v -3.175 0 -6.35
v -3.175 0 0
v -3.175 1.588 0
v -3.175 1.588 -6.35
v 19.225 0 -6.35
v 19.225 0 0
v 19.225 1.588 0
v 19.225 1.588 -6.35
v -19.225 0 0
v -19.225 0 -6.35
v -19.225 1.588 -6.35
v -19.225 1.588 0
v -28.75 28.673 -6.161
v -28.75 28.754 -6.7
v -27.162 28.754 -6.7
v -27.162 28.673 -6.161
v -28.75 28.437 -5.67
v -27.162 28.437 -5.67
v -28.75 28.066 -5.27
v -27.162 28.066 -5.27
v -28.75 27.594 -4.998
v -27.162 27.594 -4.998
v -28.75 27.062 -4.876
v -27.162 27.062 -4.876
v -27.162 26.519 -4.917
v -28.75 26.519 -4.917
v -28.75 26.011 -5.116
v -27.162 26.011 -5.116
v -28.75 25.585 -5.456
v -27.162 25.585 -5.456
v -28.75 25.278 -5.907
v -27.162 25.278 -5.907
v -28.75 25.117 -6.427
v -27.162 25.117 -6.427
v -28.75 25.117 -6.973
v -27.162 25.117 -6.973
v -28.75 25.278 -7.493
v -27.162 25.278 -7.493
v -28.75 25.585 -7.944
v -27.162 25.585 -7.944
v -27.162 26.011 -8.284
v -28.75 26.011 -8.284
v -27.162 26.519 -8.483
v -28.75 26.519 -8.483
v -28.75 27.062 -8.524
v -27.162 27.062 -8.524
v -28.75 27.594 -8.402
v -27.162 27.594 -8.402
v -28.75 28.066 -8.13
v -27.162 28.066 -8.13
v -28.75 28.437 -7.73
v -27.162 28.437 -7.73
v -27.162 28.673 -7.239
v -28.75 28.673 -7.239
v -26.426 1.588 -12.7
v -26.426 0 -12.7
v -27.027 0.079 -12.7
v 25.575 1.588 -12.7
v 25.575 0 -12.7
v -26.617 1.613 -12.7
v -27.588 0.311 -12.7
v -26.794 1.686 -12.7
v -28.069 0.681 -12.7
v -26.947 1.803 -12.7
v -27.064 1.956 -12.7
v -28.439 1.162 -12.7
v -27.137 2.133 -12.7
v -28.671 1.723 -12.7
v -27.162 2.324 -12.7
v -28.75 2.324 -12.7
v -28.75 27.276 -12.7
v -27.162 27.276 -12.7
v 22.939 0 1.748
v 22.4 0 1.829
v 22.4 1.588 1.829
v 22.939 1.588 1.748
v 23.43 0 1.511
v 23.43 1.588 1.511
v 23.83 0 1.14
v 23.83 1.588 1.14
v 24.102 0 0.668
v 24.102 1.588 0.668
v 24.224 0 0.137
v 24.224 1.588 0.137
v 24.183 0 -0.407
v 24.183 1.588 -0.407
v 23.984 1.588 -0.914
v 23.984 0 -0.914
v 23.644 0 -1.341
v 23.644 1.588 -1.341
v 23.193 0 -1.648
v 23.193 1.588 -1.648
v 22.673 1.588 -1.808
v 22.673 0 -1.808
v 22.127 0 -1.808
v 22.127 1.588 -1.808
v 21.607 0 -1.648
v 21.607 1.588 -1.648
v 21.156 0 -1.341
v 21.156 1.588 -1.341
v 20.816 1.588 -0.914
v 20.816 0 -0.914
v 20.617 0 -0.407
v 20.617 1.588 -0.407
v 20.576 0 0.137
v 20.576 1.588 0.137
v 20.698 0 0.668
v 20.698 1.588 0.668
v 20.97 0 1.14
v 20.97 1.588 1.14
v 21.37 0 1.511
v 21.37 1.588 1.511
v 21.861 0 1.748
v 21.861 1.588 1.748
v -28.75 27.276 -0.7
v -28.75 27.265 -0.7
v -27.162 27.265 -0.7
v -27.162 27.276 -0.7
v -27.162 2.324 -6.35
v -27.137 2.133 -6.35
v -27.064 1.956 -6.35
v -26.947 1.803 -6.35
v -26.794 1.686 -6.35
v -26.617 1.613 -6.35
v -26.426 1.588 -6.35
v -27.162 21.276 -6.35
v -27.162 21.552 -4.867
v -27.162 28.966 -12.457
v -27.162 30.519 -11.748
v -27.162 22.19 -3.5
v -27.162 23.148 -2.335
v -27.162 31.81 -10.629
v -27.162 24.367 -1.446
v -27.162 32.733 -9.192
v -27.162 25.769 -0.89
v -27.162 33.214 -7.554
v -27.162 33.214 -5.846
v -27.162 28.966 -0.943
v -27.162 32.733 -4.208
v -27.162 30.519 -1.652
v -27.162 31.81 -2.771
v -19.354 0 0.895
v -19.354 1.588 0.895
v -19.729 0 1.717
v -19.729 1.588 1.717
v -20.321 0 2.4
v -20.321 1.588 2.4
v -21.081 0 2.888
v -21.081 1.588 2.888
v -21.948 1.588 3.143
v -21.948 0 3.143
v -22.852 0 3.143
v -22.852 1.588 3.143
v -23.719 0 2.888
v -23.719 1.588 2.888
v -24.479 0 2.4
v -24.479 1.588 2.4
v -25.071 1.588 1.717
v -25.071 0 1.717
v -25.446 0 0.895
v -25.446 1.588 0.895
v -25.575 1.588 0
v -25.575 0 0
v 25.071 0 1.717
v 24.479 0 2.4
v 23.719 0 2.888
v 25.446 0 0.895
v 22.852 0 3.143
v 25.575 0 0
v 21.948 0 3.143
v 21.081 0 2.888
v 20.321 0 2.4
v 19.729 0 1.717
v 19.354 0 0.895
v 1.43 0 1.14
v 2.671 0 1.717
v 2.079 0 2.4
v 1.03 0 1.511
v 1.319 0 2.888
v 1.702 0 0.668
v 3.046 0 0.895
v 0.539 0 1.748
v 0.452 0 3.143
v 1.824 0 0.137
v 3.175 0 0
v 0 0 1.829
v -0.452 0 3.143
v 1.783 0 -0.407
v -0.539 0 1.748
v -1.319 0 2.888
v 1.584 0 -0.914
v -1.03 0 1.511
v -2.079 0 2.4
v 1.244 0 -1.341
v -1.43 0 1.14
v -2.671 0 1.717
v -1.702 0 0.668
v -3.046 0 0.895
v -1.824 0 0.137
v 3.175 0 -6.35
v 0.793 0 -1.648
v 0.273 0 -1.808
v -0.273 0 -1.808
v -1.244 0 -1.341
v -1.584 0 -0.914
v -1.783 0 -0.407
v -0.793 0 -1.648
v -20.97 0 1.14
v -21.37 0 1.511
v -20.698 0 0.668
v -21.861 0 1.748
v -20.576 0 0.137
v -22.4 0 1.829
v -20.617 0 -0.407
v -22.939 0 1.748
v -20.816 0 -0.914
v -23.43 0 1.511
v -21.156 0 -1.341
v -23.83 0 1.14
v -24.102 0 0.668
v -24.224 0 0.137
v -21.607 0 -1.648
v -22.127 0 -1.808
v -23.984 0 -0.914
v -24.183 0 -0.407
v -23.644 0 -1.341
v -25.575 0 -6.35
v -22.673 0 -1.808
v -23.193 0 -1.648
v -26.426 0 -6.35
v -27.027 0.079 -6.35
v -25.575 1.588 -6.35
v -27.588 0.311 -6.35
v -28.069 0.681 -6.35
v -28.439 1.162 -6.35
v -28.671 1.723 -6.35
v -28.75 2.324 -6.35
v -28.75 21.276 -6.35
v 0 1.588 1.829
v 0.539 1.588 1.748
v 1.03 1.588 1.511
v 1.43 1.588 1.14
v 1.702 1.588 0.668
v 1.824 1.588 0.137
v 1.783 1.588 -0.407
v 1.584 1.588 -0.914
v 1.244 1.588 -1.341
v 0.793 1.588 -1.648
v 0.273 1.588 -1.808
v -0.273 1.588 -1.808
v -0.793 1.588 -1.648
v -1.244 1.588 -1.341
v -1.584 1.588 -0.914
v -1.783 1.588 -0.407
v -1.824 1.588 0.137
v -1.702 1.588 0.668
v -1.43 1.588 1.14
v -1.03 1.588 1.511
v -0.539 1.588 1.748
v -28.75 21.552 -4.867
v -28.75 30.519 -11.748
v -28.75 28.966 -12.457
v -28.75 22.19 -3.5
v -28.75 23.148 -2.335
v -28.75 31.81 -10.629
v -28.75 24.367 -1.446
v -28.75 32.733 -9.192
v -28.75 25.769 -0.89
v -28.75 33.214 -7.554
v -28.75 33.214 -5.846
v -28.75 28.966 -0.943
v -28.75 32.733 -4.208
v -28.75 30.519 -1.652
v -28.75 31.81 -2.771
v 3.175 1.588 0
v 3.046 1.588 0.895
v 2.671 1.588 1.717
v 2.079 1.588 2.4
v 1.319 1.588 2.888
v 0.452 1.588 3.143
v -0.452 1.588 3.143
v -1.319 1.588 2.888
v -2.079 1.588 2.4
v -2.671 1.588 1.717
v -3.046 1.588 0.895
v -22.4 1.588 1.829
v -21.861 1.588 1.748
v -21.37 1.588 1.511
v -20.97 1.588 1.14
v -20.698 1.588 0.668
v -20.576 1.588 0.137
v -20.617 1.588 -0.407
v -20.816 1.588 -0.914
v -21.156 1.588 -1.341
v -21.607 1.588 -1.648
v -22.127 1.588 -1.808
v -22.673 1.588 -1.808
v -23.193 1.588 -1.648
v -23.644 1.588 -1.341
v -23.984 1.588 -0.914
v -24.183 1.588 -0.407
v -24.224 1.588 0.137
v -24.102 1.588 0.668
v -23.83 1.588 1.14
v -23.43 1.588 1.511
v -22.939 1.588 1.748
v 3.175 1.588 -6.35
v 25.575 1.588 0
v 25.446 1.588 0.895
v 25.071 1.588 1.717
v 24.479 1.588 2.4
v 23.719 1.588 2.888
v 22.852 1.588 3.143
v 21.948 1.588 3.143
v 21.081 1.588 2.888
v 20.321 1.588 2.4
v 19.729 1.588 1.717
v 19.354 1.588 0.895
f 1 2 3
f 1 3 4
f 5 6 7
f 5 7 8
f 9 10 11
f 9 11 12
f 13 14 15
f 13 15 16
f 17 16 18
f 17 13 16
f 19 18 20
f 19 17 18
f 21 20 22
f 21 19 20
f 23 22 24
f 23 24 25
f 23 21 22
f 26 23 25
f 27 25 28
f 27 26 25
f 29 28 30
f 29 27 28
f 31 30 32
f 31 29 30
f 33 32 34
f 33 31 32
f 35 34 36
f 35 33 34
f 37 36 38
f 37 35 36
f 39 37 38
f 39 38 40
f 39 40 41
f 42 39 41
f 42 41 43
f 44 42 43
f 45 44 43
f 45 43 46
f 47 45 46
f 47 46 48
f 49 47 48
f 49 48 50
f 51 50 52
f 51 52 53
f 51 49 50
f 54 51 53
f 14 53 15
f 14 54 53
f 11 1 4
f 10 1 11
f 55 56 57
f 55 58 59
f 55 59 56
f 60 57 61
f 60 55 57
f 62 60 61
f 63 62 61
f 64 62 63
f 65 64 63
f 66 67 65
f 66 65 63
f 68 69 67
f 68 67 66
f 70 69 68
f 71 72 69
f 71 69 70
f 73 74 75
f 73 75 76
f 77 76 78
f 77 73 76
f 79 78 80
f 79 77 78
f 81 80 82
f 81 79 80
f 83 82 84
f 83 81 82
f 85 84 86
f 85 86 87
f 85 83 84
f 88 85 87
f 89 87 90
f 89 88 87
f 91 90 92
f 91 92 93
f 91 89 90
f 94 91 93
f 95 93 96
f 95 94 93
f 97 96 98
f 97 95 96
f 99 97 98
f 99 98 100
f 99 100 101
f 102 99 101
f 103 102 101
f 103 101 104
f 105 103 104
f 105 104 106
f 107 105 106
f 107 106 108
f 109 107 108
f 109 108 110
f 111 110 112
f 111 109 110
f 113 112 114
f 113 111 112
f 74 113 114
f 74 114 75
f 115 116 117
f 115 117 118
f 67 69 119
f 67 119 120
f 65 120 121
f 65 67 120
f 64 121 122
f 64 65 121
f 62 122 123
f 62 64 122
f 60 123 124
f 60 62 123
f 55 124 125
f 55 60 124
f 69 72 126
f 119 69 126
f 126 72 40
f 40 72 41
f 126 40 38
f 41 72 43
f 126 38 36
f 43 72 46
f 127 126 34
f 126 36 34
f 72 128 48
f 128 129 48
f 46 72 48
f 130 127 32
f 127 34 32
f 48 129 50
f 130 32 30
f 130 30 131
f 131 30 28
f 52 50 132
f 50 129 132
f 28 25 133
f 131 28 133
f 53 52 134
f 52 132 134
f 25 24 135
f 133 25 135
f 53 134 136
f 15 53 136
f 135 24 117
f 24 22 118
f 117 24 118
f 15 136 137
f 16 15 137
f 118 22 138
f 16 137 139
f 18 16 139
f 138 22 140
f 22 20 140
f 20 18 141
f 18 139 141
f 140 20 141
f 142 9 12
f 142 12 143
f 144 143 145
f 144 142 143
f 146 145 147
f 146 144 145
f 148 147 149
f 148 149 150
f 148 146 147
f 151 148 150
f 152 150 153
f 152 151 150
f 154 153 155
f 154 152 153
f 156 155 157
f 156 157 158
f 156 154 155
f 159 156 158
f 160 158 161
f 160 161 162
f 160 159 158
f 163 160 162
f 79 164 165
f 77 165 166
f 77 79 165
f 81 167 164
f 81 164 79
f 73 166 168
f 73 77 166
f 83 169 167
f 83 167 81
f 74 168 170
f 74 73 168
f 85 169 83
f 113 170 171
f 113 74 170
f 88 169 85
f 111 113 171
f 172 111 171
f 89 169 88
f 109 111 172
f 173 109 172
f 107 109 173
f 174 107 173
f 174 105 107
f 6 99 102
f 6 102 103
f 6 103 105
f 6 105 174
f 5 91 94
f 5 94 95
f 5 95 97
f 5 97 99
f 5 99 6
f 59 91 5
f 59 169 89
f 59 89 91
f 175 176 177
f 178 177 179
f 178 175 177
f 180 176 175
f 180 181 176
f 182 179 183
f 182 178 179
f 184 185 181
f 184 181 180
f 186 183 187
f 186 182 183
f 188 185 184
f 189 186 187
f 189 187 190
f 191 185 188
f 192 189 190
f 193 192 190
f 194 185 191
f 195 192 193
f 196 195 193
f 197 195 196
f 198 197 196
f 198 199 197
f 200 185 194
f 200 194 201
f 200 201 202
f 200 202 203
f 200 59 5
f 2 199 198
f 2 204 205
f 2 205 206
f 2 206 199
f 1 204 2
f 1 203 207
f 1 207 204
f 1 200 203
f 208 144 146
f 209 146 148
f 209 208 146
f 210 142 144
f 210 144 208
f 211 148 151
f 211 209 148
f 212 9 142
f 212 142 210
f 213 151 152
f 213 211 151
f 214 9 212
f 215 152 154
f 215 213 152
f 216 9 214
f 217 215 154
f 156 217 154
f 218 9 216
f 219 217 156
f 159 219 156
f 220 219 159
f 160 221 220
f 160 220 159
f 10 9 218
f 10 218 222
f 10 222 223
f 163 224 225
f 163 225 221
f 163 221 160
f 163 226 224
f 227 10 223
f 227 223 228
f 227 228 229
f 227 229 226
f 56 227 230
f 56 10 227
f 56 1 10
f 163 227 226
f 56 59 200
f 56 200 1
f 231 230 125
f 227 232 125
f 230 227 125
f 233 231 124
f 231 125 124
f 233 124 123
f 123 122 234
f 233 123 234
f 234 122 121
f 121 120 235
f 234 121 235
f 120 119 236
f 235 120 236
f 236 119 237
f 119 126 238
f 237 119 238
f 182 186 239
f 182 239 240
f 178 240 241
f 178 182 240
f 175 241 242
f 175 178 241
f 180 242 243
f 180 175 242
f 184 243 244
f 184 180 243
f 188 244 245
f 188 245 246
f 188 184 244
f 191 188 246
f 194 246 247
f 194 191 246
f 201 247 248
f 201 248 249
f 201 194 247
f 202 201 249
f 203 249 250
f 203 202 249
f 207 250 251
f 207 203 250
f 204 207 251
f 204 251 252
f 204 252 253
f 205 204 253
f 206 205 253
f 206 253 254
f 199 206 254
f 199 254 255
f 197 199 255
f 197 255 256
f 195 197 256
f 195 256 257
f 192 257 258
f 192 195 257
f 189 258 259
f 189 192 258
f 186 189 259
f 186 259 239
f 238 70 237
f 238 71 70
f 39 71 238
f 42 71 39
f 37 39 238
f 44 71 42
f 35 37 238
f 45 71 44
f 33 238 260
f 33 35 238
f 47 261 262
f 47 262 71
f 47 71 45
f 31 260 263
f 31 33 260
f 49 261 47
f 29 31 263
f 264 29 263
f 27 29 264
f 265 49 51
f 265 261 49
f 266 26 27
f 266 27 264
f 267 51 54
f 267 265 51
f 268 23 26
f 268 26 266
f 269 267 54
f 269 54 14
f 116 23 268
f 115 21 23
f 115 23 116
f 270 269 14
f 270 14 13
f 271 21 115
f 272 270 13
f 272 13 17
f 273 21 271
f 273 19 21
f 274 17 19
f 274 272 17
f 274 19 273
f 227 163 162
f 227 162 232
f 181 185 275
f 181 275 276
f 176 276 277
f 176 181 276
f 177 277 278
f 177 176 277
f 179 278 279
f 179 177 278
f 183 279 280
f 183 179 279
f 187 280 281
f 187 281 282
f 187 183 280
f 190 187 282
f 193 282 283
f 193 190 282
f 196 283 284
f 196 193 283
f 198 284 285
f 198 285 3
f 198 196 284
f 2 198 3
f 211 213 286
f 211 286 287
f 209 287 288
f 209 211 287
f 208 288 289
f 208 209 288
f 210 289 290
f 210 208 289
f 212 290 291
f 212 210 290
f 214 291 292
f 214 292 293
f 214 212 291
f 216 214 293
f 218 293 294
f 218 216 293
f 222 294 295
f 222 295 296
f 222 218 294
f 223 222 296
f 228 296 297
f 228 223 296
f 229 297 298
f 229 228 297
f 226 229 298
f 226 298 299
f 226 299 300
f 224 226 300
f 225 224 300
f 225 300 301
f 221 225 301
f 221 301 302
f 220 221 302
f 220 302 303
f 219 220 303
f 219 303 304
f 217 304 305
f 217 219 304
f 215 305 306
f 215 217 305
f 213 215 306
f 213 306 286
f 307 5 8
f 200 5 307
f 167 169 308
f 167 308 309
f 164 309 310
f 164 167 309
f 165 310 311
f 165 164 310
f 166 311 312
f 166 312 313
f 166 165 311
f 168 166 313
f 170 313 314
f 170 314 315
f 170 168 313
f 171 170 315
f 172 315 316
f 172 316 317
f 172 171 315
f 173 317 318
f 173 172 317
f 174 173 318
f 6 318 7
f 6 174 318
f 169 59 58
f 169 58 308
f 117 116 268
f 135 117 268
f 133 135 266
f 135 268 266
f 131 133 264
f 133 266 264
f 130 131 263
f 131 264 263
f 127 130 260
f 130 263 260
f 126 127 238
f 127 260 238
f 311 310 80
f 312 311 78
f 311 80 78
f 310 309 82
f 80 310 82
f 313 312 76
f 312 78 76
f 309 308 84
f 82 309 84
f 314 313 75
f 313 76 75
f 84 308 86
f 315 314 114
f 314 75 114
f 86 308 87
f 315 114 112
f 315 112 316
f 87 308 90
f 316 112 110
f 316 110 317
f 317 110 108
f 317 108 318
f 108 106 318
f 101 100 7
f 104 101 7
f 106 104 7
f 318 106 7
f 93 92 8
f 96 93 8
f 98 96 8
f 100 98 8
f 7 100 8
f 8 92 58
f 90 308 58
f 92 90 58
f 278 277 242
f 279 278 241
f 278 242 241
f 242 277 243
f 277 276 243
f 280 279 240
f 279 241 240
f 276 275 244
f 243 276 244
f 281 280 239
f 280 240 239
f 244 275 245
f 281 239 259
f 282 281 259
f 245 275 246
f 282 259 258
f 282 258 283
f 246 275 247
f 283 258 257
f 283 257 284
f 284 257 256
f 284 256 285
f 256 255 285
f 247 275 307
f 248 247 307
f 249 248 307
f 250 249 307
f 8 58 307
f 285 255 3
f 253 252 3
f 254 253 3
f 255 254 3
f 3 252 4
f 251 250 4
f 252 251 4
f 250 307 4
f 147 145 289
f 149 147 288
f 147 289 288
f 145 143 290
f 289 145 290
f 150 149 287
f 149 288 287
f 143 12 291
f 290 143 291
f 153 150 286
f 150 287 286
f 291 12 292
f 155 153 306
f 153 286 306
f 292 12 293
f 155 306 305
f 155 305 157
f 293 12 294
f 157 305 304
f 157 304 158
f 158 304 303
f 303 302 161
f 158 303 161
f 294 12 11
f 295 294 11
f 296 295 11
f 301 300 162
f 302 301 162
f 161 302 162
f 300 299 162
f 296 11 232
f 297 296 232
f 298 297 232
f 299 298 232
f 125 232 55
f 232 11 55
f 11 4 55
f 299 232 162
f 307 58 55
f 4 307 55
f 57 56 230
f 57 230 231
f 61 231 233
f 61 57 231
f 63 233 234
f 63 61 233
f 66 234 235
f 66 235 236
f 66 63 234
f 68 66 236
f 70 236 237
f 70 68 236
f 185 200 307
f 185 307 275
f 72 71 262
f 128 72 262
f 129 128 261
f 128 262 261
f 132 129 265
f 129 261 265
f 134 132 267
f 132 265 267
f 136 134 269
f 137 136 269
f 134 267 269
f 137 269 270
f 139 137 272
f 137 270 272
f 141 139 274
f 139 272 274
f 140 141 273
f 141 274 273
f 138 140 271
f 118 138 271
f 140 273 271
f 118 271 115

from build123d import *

# Parameters (mm, degrees)
SKETCH1_R                    = 1.8288
BASE_FLANGE1_DEPTH           = 1.5875
EDGE_FLANGE2_STRIP_W         = 7.8232
EDGE_FLANGE2_STRIP_H         = 1.5875
EDGE_FLANGE2_STRIP_CUT_DEPTH = 6.35
EDGE_FLANGE2_DEPTH           = 6.35
SKETCH19_W                   = 5.65
SKETCH19_H                   = 12
TAB1_DEPTH                   = 1.5875
HOLE1_START                  = -28.75
HOLE1_OUTLINE_R              = 1.8288
HOLE1_DEPTH                  = 1.5875
FILLET1_R                    = 6


# Read off the part's stored shape, not the designer's step: Hole1
# Sheet-metal steps are written as plain solids
with BuildPart() as part:
    # Sketch1 → Base-Flange1 (new body)
    with BuildSketch(Plane(origin=(0, 0, 0), x_dir=(1, 0, 0), z_dir=(0, 1, 0))):
        with BuildLine():
            Line((-25.575, 0), (-25.575, 6.35))
            Line((-25.575, 6.35), (-27.1625, 6.35))
            Line((-27.1625, 6.35), (-27.1625, 12.7))
            Line((-27.1625, 12.7), (0, 12.7))
            Line((0, 12.7), (25.575, 12.7))
            Line((25.575, 12.7), (25.575, 0))
            ThreePointArc((25.575, 0), (22.4, -3.175), (19.225, 0))
            Line((19.225, 0), (19.225, 6.35))
            Line((19.225, 6.35), (3.175, 6.35))
            Line((3.175, 6.35), (3.175, 0))
            ThreePointArc((3.175, 0), (0, -3.175), (-3.175, 0))
            Line((-3.175, 0), (-3.175, 6.35))
            Line((-3.175, 6.35), (-19.225, 6.35))
            Line((-19.225, 6.35), (-19.225, 0))
            ThreePointArc((-19.225, 0), (-22.4, -3.175), (-25.575, 0))
        make_face()
        with Locations(Location((0, 0, 0), (0, 0, 270))):
            Circle(SKETCH1_R, mode=Mode.SUBTRACT)
        with Locations(Location((22.4, 0, 0), (0, 0, 270))):
            Circle(SKETCH1_R, mode=Mode.SUBTRACT)
        with Locations(Location((-22.4, 0, 0), (0, 0, 270))):
            Circle(SKETCH1_R, mode=Mode.SUBTRACT)
    extrude(amount=BASE_FLANGE1_DEPTH)

    # Edge-Flange2 strip (across the edge) → Edge-Flange2 strip cut (cut)
    with BuildSketch(Plane(origin=(-27.1625, 1.5875, -12.7), x_dir=(1, 0, 0), z_dir=(0, 0, 1))):
        with Locations((-3.175, -0.79375)):
            Rectangle(EDGE_FLANGE2_STRIP_W, EDGE_FLANGE2_STRIP_H)
    extrude(amount=EDGE_FLANGE2_STRIP_CUT_DEPTH, mode=Mode.SUBTRACT)

    # Edge-Flange2 section (across the edge) → Edge-Flange2 (add)
    with BuildSketch(Plane(origin=(-27.1625, 1.5875, -12.7), x_dir=(1, 0, 0), z_dir=(0, 0, 1))):
        with BuildLine():
            Line((-1.5875, 0.7366), (-1.5875, 31.688))
            Line((-1.5875, 31.688), (0, 31.688))
            Line((0, 31.688), (0, 0.7366))
            ThreePointArc((0, 0.7366), (0.215745145, 0.215745145), (0.7366, 0))
            Line((0.7366, 0), (0.7366, -1.5875))
            ThreePointArc((0.7366, -1.5875), (-0.90678687, -0.90678687), (-1.5875, 0.7366))
        make_face()
    extrude(amount=EDGE_FLANGE2_DEPTH)

    # Sketch19 → Tab1 (add)
    with BuildSketch(Plane.ZY.offset(28.75)):
        with Locations((-3.525, 27.2755)):
            Rectangle(SKETCH19_W, SKETCH19_H)
    extrude(amount=-TAB1_DEPTH)

    # Hole1 outline → Hole1 (cut)
    with BuildSketch(Plane.YZ.offset(HOLE1_START)):
        with Locations((26.9255, -6.7)):
            Circle(HOLE1_OUTLINE_R)
    extrude(amount=HOLE1_DEPTH, mode=Mode.SUBTRACT)

    # Fillet1
    # the kernel refuses this fillet: 6 mm, written as the material it takes off along each edge
    with BuildSketch(Plane(origin=(-43.724457419, 21.2755, -0.7), x_dir=(0, 0, -1), z_dir=(1, 0, 0))) as fillet1_piece_1:
        with BuildLine():
            CenterArc((6, 5.989782968), FILLET1_R, 180, 86.655847796)
            Line((0, 5.989782968), (-0.12, 5.989782968))
            Line((-0.12, 5.989782968), (-0.12, 0))
            Line((-0.12, 0), (0, -0.12))
            ThreePointArc((0, -0.12), (2.825, -0.12), (5.643, -0.119795659))
            Line((5.643, -0.119795659), (5.65, 0))
        make_face()
    extrude(amount=31.536414838, mode=Mode.SUBTRACT)
    with BuildSketch(Plane(origin=(-43.75, 33.2755, -0.7), x_dir=(0, 0, -1), z_dir=(1, 0, 0)), Plane(origin=(-43.75, 33.2755, -12.7), x_dir=(0, -1, 0), z_dir=(1, 0, 0))) as fillet1_piece_2:
        with BuildLine():
            CenterArc((FILLET1_R, -FILLET1_R), FILLET1_R, 90, 90)
            Line((0, -FILLET1_R), (-FILLET1_R * 0.02, -FILLET1_R))
            Line((-FILLET1_R * 0.02, -FILLET1_R), (-FILLET1_R * 0.02, FILLET1_R * 0.02))
            Line((-FILLET1_R * 0.02, FILLET1_R * 0.02), (FILLET1_R, FILLET1_R * 0.02))
            Line((FILLET1_R, FILLET1_R * 0.02), (FILLET1_R, 0))
        make_face()
    extrude(amount=31.5875, mode=Mode.SUBTRACT)


solid = part.part
